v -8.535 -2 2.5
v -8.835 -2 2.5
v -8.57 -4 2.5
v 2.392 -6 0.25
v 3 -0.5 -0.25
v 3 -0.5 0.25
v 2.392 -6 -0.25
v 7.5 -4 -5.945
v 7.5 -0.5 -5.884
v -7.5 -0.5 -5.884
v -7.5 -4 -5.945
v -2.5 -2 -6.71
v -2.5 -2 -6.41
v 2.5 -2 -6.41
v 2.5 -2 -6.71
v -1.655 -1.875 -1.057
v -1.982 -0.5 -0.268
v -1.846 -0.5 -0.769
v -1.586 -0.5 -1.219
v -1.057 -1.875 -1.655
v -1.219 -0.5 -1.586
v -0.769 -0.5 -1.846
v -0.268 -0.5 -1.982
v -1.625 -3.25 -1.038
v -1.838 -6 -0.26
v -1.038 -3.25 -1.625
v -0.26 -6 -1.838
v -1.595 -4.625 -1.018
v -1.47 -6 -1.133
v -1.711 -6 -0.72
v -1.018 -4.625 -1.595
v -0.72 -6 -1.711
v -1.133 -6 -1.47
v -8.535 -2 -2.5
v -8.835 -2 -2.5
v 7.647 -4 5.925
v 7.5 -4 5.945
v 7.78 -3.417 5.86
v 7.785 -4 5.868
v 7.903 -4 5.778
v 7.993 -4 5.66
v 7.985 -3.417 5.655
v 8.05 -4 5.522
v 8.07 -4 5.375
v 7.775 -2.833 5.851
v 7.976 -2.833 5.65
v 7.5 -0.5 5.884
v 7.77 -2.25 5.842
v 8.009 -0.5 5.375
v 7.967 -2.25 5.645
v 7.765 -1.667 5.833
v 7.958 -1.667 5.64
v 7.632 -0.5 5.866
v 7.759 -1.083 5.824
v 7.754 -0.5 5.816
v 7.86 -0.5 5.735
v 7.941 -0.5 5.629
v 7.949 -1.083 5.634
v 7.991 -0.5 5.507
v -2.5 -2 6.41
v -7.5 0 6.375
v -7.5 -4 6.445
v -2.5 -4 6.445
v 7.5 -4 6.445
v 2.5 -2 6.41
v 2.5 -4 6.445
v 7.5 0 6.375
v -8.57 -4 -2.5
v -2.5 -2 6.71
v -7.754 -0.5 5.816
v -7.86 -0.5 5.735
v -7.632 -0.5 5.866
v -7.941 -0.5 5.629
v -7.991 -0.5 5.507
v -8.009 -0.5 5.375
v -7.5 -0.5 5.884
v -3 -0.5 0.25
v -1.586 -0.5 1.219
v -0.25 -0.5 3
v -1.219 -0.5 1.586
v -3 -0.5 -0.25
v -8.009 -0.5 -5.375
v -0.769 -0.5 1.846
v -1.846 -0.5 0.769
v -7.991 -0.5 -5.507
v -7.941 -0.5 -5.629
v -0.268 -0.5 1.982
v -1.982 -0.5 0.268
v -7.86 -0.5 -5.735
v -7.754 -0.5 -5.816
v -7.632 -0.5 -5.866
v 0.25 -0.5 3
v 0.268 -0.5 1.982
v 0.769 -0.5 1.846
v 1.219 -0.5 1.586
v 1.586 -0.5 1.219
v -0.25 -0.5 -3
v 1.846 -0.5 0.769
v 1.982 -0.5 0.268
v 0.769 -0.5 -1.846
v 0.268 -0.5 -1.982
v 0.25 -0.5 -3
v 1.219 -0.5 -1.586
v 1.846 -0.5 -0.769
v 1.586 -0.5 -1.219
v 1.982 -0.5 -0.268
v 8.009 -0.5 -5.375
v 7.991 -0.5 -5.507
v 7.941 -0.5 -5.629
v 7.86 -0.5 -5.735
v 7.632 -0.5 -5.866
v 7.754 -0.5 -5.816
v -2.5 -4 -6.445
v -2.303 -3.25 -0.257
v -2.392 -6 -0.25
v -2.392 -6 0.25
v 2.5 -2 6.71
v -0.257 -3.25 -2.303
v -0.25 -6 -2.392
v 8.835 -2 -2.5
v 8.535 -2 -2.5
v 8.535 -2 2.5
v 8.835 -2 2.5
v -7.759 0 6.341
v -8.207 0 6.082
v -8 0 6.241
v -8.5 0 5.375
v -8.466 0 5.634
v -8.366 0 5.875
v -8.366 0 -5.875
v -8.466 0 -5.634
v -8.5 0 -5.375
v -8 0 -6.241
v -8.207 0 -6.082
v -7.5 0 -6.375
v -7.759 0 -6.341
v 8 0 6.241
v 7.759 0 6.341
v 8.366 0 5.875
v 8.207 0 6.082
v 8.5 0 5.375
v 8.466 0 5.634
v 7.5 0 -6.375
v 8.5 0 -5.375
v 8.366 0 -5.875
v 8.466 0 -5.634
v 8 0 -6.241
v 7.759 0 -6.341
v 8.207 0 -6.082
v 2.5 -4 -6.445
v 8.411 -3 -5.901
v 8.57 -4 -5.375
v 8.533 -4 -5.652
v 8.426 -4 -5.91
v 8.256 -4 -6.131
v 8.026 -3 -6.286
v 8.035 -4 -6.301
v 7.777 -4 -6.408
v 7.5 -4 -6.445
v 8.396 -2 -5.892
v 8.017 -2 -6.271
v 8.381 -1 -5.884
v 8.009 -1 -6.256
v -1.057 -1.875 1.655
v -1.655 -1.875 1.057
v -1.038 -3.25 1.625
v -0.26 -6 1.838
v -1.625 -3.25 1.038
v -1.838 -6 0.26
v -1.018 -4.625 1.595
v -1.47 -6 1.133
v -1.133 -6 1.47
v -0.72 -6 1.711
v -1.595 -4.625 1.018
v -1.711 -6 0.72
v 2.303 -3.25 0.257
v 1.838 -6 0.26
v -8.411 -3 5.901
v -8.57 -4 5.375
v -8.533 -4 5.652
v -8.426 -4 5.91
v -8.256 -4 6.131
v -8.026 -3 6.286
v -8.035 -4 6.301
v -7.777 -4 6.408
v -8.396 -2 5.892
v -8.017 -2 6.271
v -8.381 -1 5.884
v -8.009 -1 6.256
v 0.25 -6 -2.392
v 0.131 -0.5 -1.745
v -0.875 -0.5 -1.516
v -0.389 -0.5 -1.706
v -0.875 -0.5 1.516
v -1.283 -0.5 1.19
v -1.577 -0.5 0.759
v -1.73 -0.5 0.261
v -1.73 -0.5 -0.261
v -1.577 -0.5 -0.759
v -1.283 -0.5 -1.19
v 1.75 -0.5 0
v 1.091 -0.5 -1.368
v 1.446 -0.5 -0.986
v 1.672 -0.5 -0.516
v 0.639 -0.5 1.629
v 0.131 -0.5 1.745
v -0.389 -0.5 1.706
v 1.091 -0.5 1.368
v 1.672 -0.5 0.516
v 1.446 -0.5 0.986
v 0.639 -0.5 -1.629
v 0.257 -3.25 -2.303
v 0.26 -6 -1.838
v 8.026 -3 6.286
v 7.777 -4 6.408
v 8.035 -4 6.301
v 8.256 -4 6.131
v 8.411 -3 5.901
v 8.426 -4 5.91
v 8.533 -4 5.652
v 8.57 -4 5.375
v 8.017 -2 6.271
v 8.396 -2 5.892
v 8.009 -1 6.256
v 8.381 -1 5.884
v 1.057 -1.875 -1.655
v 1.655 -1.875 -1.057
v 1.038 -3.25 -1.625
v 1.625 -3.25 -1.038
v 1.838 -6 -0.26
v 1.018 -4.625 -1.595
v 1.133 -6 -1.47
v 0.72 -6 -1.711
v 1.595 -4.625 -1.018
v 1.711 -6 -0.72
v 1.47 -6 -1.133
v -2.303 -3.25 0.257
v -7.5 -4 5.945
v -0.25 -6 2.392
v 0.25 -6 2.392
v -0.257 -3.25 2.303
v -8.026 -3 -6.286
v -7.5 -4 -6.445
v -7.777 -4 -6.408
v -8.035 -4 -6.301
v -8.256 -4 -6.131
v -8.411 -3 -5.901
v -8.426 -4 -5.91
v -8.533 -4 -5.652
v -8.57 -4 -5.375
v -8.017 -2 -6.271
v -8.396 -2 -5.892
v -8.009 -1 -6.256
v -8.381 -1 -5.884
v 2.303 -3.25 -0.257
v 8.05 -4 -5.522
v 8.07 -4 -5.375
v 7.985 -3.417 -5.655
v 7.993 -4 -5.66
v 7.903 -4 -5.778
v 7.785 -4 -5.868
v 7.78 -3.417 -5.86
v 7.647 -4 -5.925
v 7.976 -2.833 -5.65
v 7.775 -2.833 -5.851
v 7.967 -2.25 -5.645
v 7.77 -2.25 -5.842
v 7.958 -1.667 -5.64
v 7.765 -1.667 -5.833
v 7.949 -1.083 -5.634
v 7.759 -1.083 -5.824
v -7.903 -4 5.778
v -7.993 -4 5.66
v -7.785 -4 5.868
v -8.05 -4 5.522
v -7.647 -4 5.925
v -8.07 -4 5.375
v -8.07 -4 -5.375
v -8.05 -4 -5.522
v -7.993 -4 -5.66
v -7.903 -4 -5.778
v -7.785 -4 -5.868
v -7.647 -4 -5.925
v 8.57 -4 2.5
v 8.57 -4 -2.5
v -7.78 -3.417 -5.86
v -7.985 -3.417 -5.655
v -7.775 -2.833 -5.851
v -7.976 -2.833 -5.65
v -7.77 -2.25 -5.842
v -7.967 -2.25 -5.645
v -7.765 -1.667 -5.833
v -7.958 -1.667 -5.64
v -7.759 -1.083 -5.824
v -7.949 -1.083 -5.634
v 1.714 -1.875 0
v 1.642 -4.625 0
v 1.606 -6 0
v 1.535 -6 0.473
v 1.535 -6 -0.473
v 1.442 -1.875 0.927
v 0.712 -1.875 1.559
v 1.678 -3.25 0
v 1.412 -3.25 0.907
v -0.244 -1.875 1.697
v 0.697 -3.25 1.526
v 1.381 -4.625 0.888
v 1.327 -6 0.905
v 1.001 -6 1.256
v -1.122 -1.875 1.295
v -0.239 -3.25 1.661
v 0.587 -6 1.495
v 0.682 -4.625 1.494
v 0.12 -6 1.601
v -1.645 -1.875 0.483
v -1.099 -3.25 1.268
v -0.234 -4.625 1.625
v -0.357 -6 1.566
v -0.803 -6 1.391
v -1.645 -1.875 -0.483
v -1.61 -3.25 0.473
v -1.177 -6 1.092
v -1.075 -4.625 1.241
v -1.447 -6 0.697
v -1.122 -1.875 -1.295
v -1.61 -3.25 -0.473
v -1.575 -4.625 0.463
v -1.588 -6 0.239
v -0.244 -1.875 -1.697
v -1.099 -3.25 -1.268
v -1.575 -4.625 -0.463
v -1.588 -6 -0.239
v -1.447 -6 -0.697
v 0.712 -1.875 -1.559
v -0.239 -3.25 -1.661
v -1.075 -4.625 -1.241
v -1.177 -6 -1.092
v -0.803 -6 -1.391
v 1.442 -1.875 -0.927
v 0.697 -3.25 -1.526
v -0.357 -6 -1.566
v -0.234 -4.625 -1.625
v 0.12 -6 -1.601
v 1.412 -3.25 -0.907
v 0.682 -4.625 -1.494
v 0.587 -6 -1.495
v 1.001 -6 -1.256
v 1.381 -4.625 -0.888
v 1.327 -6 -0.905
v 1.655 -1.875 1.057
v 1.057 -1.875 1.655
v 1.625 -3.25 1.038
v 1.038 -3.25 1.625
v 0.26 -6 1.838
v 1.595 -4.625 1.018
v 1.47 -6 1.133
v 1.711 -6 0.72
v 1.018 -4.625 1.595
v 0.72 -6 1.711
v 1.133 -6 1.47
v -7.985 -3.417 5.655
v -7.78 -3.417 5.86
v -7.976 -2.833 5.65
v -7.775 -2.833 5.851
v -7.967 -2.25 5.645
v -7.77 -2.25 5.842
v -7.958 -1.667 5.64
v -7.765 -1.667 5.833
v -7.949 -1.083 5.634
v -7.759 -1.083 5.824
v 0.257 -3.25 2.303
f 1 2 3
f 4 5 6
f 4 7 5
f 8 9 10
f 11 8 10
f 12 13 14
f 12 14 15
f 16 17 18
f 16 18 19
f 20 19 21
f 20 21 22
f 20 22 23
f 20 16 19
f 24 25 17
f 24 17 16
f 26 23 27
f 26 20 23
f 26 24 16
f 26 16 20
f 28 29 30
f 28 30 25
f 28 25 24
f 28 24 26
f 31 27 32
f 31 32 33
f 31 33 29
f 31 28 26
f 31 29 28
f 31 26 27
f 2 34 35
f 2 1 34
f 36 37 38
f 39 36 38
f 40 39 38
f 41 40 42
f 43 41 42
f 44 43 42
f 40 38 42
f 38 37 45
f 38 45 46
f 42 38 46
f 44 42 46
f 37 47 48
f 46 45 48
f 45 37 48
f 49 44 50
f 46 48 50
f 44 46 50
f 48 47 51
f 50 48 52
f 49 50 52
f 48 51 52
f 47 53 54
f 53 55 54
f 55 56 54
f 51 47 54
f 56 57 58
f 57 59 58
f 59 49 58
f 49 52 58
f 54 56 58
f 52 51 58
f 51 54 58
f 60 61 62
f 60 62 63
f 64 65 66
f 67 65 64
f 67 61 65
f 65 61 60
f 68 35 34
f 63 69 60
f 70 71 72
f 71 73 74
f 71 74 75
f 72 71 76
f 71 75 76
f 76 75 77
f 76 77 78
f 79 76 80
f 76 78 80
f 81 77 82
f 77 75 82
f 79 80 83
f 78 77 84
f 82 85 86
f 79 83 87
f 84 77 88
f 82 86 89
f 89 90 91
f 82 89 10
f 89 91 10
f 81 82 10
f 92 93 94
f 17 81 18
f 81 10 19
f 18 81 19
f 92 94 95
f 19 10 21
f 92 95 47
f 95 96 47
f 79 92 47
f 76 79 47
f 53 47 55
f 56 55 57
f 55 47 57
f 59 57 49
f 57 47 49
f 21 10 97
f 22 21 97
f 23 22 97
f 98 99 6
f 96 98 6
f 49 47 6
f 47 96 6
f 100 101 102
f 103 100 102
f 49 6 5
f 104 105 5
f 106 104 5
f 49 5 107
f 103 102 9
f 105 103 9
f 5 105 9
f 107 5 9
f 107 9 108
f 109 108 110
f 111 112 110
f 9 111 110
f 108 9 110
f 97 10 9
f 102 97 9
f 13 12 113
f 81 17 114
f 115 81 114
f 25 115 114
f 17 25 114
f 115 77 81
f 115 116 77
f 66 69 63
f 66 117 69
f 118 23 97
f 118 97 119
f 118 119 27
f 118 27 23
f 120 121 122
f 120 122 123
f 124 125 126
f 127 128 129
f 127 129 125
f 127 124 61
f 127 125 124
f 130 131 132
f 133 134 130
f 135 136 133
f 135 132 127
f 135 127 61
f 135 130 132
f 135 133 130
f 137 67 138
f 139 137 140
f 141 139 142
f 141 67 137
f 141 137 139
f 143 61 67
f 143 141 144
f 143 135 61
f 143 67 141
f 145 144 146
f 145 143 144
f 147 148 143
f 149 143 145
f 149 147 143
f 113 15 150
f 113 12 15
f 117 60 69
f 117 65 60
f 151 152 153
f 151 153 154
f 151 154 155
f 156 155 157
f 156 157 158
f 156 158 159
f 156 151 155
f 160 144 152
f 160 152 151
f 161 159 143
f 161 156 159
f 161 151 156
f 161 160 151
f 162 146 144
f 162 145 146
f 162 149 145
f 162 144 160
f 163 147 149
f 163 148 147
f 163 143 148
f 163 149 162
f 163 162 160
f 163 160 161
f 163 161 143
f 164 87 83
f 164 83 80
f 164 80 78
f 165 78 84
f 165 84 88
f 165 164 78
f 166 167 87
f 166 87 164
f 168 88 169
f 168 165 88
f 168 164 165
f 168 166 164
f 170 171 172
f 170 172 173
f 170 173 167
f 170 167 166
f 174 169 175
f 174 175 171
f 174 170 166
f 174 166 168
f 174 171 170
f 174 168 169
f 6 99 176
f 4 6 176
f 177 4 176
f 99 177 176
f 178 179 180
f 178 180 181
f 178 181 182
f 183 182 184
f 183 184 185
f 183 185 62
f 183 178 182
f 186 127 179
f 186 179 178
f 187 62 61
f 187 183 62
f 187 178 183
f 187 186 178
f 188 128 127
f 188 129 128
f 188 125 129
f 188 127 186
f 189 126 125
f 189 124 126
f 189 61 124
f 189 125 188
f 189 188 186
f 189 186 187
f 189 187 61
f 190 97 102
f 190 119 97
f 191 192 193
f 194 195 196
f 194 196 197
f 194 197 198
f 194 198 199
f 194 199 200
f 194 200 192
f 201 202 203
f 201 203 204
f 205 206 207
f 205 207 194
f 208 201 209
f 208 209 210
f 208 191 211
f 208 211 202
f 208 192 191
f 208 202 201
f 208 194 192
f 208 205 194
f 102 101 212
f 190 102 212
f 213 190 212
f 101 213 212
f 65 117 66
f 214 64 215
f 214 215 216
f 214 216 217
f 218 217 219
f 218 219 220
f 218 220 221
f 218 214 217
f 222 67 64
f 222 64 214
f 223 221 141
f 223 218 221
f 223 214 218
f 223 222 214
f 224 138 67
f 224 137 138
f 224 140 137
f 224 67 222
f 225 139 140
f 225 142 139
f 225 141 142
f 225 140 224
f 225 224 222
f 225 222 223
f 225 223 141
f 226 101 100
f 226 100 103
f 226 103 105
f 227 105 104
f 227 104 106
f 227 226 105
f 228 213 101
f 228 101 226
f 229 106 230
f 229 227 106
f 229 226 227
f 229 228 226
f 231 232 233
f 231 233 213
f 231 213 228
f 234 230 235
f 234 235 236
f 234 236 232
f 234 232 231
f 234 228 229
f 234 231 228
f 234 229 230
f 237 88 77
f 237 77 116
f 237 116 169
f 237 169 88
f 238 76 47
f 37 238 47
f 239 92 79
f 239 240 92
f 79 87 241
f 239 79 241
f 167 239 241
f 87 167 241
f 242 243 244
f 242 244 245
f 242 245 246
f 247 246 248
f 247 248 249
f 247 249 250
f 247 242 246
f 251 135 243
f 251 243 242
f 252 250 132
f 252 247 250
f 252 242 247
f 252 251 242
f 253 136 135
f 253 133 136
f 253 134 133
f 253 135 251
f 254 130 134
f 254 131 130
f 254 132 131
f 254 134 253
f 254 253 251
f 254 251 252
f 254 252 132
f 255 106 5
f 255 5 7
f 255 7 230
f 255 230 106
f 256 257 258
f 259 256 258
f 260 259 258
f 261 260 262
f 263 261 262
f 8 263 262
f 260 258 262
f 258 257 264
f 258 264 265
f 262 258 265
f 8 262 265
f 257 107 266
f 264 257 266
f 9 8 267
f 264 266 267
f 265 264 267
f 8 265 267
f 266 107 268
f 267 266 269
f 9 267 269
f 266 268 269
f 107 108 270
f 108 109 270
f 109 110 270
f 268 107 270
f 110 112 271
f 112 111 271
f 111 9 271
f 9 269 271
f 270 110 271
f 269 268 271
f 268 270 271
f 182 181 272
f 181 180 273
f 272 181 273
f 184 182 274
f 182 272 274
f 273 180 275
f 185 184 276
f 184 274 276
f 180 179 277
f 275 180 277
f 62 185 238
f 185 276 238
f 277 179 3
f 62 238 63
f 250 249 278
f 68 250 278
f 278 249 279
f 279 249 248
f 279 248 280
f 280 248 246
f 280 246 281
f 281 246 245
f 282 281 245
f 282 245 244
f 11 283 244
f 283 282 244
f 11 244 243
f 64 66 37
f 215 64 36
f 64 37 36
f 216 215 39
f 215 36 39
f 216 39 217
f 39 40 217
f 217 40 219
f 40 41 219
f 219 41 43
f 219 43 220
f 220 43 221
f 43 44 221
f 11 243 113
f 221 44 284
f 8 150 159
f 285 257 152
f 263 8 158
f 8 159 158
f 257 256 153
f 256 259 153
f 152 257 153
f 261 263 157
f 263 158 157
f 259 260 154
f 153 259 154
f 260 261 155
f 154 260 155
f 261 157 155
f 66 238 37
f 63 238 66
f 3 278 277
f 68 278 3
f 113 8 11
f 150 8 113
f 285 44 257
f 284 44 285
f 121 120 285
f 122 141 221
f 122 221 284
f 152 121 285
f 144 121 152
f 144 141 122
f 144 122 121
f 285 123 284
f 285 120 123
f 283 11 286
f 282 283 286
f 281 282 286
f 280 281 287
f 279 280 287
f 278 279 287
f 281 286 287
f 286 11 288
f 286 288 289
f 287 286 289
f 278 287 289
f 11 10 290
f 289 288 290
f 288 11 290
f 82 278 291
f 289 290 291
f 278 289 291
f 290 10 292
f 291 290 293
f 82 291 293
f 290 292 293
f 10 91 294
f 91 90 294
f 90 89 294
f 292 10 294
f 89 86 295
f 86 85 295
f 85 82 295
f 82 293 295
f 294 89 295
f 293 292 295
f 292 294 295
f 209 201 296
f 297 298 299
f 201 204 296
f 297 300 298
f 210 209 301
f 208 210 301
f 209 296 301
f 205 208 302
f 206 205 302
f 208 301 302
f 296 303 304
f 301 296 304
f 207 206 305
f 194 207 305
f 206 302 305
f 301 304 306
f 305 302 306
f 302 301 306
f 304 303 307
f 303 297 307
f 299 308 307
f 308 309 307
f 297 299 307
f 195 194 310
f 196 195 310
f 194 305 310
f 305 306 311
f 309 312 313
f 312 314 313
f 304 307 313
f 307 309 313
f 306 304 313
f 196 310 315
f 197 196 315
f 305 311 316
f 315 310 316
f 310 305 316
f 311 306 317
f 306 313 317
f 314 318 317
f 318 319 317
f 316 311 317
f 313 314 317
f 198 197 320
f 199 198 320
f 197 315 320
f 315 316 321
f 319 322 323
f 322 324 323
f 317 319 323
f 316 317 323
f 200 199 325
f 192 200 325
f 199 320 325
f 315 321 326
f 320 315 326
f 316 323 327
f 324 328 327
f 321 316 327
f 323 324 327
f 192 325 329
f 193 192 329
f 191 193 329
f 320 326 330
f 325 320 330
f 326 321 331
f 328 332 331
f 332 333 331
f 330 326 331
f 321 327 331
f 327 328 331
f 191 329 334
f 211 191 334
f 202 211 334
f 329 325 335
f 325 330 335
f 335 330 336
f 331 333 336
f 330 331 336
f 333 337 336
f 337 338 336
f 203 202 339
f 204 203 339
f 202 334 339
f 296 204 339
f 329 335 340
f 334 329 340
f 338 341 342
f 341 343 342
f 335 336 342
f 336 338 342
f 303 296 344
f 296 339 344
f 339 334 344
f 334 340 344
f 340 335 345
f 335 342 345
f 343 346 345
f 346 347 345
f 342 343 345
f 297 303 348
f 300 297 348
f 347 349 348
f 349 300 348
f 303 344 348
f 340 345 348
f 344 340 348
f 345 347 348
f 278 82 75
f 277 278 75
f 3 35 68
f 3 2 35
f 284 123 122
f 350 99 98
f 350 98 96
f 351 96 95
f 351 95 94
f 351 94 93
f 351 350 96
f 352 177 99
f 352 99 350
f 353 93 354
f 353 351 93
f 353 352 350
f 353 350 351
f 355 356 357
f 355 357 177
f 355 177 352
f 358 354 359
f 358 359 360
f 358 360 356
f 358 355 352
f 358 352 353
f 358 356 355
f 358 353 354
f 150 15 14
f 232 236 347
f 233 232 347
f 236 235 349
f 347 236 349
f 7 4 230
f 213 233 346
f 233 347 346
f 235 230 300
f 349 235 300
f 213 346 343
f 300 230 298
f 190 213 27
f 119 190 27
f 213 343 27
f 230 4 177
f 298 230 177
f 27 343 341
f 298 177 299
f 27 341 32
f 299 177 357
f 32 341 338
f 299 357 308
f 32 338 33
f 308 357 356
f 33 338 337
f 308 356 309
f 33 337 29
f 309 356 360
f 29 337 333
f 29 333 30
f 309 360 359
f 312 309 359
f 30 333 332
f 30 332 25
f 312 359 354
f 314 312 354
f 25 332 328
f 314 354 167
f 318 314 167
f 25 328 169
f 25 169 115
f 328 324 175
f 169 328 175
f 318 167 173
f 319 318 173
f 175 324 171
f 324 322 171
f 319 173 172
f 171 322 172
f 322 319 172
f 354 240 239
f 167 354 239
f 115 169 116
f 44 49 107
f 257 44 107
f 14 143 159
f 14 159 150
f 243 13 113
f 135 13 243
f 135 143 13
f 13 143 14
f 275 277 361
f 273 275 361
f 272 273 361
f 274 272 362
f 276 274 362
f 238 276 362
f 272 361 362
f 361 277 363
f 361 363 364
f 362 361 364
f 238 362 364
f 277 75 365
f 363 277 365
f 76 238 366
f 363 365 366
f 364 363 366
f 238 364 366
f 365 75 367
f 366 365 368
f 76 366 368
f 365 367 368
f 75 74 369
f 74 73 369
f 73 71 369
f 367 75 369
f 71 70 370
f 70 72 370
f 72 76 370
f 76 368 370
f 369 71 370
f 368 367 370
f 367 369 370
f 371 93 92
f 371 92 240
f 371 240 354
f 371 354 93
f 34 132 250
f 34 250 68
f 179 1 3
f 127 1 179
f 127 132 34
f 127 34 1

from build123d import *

# Parameters (mm, degrees)
BOSS_EXTRUDE1_DEPTH = 4
BOSS_EXTRUDE1_DRAFT = 1
SHELL1_T            = -0.5
SKETCH2_R           = 2
BOSS_EXTRUDE2_DEPTH = 5.5
BOSS_EXTRUDE2_TAPER = 1.5
CIRPATTERN1_COUNT   = 4
SKETCH4_R           = 1.605977431
CUT_EXTRUDE1_DEPTH  = 5.5
CUT_EXTRUDE1_DRAFT  = 1.5
BOSS_EXTRUDE3_DEPTH = 2.5
BOSS_EXTRUDE4_DEPTH = 2.5


with BuildPart() as part:
    # Sketch1 → Boss-Extrude1 (with draft: the straight prism first)
    with BuildSketch(Plane(origin=(0, 0, 0), x_dir=(1, 0, 0), z_dir=(0, 1, 0))):
        with BuildLine():
            Line((-7.5, -6.375), (7.5, -6.375))
            ThreePointArc((7.5, -6.375), (8.207106781, -6.082106781), (8.5, -5.375))
            Line((8.5, -5.375), (8.5, 5.375))
            ThreePointArc((8.5, 5.375), (8.207106781, 6.082106781), (7.5, 6.375))
            Line((7.5, 6.375), (-7.5, 6.375))
            ThreePointArc((-7.5, 6.375), (-8.207106781, 6.082106781), (-8.5, 5.375))
            Line((-8.5, 5.375), (-8.5, -5.375))
            ThreePointArc((-8.5, -5.375), (-8.207106781, -6.082106781), (-7.5, -6.375))
        make_face()
    extrude(amount=-BOSS_EXTRUDE1_DEPTH)
    # Boss-Extrude1: the draft: its side faces are tilted about the plane it starts from
    boss_extrude1_sides = [part.faces().sort_by_distance(p)[0] for p in [
        (0, -2, 6.375),
        (8.207106781, -2, 6.082106781),
        (8.5, -2, 0),
        (8.207106781, -2, -6.082106781),
        (0, -2, -6.375),
        (-8.207106781, -2, -6.082106781),
        (-8.5, -2, 0),
        (-8.207106781, -2, 6.082106781),
    ]]
    draft(boss_extrude1_sides, Plane(origin=(0, 0, 0), x_dir=(1, 0, 0), z_dir=(0, 1, 0)), BOSS_EXTRUDE1_DRAFT)

    # Shell1
    shell1_openings = [part.faces().sort_by_distance(p)[0] for p in [
        (0, -4, 0),
    ]]
    offset(amount=SHELL1_T, openings=shell1_openings, kind=Kind.INTERSECTION)

    # Sketch2 → Boss-Extrude2 (add)
    with BuildSketch(Plane.XZ.offset(0.5)):
        Circle(SKETCH2_R)
    extrude(amount=BOSS_EXTRUDE2_DEPTH, taper=BOSS_EXTRUDE2_TAPER)

    # Rib1: read off the stored shape, not the designer's step
    # Rib1: loft between two sections, ruled curve by curve
    rib1_from = [
        Edge.make_line((1.982008415, -0.5, 0.267661433), (3, -0.5, 0.25)),
        Edge.make_line((1.982008415, -0.5, -0.267661433), (3, -0.5, -0.25)),
        Edge.make_line((3, -0.5, -0.25), (3, -0.5, 0.25)),
        Edge.make_line((1.982008415, -0.5, -0.267661433), (1.982008415, -0.5, 0.267661433)),
    ]
    rib1_to = [
        Edge.make_line((1.837730654, -6, 0.259611763), (2.391745366, -6, 0.25)),
        Edge.make_line((1.837730654, -6, -0.259611763), (2.391745366, -6, -0.25)),
        Edge.make_line((2.391745366, -6, -0.25), (2.391745366, -6, 0.25)),
        Edge.make_line((1.837730654, -6, -0.259611763), (1.837730654, -6, 0.259611763)),
    ]
    rib1 = Solid(Shell([*[Face.make_surface_from_curves(rib1_from[k], rib1_to[k]) for k in range(4)], Face(Wire(rib1_from)), Face(Wire(rib1_to))]))
    add(rib1)

    # CirPattern1: Rib1 ×4 about axis
    cirpattern1_axis = Axis((0, 0, 0), (0, 1, 0))
    for i in range(1, CIRPATTERN1_COUNT):
        add(rib1.rotate(cirpattern1_axis, i * 360 / CIRPATTERN1_COUNT))


with BuildPart() as cut_extrude1_tool:
    # Sketch4 → Cut-Extrude1 (with draft: the straight prism first)
    with BuildSketch(Plane.XZ.offset(6)):
        Circle(SKETCH4_R)
    extrude(amount=-CUT_EXTRUDE1_DEPTH)
    # Cut-Extrude1: the draft: its side faces are tilted about the plane it starts from
    cut_extrude1_sides = [cut_extrude1_tool.faces().sort_by_distance(p)[0] for p in [
        (-1.605977431, -3.25, 0),
    ]]
    draft(cut_extrude1_sides, Plane.XZ.offset(6), CUT_EXTRUDE1_DRAFT)


with BuildPart() as part_1:
    add(part.part)

    # Cut-Extrude1: cut by cut_extrude1_tool
    add(cut_extrude1_tool.part, mode=Mode.SUBTRACT)

    # Sketch5 → Boss-Extrude3 (add, symmetric)
    with BuildSketch(Plane(origin=(0, 0, 0), x_dir=(0, 0, -1), z_dir=(1, 0, 0))):
        Polygon((6.44482026, -4), (6.40991013, -2), (6.70991013, -2), align=None)
        Polygon((-6.70991013, -2), (-6.44482026, -4), (-6.40991013, -2), align=None)
    extrude(amount=BOSS_EXTRUDE3_DEPTH, both=True)

    # Sketch6 → Boss-Extrude4 (add, symmetric)
    with BuildSketch(Plane.XY):
        Polygon((8.56982026, -4), (8.53491013, -2), (8.83491013, -2), align=None)
        Polygon((-8.83491013, -2), (-8.56982026, -4), (-8.53491013, -2), align=None)
    extrude(amount=BOSS_EXTRUDE4_DEPTH, both=True)


solid = part_1.part
